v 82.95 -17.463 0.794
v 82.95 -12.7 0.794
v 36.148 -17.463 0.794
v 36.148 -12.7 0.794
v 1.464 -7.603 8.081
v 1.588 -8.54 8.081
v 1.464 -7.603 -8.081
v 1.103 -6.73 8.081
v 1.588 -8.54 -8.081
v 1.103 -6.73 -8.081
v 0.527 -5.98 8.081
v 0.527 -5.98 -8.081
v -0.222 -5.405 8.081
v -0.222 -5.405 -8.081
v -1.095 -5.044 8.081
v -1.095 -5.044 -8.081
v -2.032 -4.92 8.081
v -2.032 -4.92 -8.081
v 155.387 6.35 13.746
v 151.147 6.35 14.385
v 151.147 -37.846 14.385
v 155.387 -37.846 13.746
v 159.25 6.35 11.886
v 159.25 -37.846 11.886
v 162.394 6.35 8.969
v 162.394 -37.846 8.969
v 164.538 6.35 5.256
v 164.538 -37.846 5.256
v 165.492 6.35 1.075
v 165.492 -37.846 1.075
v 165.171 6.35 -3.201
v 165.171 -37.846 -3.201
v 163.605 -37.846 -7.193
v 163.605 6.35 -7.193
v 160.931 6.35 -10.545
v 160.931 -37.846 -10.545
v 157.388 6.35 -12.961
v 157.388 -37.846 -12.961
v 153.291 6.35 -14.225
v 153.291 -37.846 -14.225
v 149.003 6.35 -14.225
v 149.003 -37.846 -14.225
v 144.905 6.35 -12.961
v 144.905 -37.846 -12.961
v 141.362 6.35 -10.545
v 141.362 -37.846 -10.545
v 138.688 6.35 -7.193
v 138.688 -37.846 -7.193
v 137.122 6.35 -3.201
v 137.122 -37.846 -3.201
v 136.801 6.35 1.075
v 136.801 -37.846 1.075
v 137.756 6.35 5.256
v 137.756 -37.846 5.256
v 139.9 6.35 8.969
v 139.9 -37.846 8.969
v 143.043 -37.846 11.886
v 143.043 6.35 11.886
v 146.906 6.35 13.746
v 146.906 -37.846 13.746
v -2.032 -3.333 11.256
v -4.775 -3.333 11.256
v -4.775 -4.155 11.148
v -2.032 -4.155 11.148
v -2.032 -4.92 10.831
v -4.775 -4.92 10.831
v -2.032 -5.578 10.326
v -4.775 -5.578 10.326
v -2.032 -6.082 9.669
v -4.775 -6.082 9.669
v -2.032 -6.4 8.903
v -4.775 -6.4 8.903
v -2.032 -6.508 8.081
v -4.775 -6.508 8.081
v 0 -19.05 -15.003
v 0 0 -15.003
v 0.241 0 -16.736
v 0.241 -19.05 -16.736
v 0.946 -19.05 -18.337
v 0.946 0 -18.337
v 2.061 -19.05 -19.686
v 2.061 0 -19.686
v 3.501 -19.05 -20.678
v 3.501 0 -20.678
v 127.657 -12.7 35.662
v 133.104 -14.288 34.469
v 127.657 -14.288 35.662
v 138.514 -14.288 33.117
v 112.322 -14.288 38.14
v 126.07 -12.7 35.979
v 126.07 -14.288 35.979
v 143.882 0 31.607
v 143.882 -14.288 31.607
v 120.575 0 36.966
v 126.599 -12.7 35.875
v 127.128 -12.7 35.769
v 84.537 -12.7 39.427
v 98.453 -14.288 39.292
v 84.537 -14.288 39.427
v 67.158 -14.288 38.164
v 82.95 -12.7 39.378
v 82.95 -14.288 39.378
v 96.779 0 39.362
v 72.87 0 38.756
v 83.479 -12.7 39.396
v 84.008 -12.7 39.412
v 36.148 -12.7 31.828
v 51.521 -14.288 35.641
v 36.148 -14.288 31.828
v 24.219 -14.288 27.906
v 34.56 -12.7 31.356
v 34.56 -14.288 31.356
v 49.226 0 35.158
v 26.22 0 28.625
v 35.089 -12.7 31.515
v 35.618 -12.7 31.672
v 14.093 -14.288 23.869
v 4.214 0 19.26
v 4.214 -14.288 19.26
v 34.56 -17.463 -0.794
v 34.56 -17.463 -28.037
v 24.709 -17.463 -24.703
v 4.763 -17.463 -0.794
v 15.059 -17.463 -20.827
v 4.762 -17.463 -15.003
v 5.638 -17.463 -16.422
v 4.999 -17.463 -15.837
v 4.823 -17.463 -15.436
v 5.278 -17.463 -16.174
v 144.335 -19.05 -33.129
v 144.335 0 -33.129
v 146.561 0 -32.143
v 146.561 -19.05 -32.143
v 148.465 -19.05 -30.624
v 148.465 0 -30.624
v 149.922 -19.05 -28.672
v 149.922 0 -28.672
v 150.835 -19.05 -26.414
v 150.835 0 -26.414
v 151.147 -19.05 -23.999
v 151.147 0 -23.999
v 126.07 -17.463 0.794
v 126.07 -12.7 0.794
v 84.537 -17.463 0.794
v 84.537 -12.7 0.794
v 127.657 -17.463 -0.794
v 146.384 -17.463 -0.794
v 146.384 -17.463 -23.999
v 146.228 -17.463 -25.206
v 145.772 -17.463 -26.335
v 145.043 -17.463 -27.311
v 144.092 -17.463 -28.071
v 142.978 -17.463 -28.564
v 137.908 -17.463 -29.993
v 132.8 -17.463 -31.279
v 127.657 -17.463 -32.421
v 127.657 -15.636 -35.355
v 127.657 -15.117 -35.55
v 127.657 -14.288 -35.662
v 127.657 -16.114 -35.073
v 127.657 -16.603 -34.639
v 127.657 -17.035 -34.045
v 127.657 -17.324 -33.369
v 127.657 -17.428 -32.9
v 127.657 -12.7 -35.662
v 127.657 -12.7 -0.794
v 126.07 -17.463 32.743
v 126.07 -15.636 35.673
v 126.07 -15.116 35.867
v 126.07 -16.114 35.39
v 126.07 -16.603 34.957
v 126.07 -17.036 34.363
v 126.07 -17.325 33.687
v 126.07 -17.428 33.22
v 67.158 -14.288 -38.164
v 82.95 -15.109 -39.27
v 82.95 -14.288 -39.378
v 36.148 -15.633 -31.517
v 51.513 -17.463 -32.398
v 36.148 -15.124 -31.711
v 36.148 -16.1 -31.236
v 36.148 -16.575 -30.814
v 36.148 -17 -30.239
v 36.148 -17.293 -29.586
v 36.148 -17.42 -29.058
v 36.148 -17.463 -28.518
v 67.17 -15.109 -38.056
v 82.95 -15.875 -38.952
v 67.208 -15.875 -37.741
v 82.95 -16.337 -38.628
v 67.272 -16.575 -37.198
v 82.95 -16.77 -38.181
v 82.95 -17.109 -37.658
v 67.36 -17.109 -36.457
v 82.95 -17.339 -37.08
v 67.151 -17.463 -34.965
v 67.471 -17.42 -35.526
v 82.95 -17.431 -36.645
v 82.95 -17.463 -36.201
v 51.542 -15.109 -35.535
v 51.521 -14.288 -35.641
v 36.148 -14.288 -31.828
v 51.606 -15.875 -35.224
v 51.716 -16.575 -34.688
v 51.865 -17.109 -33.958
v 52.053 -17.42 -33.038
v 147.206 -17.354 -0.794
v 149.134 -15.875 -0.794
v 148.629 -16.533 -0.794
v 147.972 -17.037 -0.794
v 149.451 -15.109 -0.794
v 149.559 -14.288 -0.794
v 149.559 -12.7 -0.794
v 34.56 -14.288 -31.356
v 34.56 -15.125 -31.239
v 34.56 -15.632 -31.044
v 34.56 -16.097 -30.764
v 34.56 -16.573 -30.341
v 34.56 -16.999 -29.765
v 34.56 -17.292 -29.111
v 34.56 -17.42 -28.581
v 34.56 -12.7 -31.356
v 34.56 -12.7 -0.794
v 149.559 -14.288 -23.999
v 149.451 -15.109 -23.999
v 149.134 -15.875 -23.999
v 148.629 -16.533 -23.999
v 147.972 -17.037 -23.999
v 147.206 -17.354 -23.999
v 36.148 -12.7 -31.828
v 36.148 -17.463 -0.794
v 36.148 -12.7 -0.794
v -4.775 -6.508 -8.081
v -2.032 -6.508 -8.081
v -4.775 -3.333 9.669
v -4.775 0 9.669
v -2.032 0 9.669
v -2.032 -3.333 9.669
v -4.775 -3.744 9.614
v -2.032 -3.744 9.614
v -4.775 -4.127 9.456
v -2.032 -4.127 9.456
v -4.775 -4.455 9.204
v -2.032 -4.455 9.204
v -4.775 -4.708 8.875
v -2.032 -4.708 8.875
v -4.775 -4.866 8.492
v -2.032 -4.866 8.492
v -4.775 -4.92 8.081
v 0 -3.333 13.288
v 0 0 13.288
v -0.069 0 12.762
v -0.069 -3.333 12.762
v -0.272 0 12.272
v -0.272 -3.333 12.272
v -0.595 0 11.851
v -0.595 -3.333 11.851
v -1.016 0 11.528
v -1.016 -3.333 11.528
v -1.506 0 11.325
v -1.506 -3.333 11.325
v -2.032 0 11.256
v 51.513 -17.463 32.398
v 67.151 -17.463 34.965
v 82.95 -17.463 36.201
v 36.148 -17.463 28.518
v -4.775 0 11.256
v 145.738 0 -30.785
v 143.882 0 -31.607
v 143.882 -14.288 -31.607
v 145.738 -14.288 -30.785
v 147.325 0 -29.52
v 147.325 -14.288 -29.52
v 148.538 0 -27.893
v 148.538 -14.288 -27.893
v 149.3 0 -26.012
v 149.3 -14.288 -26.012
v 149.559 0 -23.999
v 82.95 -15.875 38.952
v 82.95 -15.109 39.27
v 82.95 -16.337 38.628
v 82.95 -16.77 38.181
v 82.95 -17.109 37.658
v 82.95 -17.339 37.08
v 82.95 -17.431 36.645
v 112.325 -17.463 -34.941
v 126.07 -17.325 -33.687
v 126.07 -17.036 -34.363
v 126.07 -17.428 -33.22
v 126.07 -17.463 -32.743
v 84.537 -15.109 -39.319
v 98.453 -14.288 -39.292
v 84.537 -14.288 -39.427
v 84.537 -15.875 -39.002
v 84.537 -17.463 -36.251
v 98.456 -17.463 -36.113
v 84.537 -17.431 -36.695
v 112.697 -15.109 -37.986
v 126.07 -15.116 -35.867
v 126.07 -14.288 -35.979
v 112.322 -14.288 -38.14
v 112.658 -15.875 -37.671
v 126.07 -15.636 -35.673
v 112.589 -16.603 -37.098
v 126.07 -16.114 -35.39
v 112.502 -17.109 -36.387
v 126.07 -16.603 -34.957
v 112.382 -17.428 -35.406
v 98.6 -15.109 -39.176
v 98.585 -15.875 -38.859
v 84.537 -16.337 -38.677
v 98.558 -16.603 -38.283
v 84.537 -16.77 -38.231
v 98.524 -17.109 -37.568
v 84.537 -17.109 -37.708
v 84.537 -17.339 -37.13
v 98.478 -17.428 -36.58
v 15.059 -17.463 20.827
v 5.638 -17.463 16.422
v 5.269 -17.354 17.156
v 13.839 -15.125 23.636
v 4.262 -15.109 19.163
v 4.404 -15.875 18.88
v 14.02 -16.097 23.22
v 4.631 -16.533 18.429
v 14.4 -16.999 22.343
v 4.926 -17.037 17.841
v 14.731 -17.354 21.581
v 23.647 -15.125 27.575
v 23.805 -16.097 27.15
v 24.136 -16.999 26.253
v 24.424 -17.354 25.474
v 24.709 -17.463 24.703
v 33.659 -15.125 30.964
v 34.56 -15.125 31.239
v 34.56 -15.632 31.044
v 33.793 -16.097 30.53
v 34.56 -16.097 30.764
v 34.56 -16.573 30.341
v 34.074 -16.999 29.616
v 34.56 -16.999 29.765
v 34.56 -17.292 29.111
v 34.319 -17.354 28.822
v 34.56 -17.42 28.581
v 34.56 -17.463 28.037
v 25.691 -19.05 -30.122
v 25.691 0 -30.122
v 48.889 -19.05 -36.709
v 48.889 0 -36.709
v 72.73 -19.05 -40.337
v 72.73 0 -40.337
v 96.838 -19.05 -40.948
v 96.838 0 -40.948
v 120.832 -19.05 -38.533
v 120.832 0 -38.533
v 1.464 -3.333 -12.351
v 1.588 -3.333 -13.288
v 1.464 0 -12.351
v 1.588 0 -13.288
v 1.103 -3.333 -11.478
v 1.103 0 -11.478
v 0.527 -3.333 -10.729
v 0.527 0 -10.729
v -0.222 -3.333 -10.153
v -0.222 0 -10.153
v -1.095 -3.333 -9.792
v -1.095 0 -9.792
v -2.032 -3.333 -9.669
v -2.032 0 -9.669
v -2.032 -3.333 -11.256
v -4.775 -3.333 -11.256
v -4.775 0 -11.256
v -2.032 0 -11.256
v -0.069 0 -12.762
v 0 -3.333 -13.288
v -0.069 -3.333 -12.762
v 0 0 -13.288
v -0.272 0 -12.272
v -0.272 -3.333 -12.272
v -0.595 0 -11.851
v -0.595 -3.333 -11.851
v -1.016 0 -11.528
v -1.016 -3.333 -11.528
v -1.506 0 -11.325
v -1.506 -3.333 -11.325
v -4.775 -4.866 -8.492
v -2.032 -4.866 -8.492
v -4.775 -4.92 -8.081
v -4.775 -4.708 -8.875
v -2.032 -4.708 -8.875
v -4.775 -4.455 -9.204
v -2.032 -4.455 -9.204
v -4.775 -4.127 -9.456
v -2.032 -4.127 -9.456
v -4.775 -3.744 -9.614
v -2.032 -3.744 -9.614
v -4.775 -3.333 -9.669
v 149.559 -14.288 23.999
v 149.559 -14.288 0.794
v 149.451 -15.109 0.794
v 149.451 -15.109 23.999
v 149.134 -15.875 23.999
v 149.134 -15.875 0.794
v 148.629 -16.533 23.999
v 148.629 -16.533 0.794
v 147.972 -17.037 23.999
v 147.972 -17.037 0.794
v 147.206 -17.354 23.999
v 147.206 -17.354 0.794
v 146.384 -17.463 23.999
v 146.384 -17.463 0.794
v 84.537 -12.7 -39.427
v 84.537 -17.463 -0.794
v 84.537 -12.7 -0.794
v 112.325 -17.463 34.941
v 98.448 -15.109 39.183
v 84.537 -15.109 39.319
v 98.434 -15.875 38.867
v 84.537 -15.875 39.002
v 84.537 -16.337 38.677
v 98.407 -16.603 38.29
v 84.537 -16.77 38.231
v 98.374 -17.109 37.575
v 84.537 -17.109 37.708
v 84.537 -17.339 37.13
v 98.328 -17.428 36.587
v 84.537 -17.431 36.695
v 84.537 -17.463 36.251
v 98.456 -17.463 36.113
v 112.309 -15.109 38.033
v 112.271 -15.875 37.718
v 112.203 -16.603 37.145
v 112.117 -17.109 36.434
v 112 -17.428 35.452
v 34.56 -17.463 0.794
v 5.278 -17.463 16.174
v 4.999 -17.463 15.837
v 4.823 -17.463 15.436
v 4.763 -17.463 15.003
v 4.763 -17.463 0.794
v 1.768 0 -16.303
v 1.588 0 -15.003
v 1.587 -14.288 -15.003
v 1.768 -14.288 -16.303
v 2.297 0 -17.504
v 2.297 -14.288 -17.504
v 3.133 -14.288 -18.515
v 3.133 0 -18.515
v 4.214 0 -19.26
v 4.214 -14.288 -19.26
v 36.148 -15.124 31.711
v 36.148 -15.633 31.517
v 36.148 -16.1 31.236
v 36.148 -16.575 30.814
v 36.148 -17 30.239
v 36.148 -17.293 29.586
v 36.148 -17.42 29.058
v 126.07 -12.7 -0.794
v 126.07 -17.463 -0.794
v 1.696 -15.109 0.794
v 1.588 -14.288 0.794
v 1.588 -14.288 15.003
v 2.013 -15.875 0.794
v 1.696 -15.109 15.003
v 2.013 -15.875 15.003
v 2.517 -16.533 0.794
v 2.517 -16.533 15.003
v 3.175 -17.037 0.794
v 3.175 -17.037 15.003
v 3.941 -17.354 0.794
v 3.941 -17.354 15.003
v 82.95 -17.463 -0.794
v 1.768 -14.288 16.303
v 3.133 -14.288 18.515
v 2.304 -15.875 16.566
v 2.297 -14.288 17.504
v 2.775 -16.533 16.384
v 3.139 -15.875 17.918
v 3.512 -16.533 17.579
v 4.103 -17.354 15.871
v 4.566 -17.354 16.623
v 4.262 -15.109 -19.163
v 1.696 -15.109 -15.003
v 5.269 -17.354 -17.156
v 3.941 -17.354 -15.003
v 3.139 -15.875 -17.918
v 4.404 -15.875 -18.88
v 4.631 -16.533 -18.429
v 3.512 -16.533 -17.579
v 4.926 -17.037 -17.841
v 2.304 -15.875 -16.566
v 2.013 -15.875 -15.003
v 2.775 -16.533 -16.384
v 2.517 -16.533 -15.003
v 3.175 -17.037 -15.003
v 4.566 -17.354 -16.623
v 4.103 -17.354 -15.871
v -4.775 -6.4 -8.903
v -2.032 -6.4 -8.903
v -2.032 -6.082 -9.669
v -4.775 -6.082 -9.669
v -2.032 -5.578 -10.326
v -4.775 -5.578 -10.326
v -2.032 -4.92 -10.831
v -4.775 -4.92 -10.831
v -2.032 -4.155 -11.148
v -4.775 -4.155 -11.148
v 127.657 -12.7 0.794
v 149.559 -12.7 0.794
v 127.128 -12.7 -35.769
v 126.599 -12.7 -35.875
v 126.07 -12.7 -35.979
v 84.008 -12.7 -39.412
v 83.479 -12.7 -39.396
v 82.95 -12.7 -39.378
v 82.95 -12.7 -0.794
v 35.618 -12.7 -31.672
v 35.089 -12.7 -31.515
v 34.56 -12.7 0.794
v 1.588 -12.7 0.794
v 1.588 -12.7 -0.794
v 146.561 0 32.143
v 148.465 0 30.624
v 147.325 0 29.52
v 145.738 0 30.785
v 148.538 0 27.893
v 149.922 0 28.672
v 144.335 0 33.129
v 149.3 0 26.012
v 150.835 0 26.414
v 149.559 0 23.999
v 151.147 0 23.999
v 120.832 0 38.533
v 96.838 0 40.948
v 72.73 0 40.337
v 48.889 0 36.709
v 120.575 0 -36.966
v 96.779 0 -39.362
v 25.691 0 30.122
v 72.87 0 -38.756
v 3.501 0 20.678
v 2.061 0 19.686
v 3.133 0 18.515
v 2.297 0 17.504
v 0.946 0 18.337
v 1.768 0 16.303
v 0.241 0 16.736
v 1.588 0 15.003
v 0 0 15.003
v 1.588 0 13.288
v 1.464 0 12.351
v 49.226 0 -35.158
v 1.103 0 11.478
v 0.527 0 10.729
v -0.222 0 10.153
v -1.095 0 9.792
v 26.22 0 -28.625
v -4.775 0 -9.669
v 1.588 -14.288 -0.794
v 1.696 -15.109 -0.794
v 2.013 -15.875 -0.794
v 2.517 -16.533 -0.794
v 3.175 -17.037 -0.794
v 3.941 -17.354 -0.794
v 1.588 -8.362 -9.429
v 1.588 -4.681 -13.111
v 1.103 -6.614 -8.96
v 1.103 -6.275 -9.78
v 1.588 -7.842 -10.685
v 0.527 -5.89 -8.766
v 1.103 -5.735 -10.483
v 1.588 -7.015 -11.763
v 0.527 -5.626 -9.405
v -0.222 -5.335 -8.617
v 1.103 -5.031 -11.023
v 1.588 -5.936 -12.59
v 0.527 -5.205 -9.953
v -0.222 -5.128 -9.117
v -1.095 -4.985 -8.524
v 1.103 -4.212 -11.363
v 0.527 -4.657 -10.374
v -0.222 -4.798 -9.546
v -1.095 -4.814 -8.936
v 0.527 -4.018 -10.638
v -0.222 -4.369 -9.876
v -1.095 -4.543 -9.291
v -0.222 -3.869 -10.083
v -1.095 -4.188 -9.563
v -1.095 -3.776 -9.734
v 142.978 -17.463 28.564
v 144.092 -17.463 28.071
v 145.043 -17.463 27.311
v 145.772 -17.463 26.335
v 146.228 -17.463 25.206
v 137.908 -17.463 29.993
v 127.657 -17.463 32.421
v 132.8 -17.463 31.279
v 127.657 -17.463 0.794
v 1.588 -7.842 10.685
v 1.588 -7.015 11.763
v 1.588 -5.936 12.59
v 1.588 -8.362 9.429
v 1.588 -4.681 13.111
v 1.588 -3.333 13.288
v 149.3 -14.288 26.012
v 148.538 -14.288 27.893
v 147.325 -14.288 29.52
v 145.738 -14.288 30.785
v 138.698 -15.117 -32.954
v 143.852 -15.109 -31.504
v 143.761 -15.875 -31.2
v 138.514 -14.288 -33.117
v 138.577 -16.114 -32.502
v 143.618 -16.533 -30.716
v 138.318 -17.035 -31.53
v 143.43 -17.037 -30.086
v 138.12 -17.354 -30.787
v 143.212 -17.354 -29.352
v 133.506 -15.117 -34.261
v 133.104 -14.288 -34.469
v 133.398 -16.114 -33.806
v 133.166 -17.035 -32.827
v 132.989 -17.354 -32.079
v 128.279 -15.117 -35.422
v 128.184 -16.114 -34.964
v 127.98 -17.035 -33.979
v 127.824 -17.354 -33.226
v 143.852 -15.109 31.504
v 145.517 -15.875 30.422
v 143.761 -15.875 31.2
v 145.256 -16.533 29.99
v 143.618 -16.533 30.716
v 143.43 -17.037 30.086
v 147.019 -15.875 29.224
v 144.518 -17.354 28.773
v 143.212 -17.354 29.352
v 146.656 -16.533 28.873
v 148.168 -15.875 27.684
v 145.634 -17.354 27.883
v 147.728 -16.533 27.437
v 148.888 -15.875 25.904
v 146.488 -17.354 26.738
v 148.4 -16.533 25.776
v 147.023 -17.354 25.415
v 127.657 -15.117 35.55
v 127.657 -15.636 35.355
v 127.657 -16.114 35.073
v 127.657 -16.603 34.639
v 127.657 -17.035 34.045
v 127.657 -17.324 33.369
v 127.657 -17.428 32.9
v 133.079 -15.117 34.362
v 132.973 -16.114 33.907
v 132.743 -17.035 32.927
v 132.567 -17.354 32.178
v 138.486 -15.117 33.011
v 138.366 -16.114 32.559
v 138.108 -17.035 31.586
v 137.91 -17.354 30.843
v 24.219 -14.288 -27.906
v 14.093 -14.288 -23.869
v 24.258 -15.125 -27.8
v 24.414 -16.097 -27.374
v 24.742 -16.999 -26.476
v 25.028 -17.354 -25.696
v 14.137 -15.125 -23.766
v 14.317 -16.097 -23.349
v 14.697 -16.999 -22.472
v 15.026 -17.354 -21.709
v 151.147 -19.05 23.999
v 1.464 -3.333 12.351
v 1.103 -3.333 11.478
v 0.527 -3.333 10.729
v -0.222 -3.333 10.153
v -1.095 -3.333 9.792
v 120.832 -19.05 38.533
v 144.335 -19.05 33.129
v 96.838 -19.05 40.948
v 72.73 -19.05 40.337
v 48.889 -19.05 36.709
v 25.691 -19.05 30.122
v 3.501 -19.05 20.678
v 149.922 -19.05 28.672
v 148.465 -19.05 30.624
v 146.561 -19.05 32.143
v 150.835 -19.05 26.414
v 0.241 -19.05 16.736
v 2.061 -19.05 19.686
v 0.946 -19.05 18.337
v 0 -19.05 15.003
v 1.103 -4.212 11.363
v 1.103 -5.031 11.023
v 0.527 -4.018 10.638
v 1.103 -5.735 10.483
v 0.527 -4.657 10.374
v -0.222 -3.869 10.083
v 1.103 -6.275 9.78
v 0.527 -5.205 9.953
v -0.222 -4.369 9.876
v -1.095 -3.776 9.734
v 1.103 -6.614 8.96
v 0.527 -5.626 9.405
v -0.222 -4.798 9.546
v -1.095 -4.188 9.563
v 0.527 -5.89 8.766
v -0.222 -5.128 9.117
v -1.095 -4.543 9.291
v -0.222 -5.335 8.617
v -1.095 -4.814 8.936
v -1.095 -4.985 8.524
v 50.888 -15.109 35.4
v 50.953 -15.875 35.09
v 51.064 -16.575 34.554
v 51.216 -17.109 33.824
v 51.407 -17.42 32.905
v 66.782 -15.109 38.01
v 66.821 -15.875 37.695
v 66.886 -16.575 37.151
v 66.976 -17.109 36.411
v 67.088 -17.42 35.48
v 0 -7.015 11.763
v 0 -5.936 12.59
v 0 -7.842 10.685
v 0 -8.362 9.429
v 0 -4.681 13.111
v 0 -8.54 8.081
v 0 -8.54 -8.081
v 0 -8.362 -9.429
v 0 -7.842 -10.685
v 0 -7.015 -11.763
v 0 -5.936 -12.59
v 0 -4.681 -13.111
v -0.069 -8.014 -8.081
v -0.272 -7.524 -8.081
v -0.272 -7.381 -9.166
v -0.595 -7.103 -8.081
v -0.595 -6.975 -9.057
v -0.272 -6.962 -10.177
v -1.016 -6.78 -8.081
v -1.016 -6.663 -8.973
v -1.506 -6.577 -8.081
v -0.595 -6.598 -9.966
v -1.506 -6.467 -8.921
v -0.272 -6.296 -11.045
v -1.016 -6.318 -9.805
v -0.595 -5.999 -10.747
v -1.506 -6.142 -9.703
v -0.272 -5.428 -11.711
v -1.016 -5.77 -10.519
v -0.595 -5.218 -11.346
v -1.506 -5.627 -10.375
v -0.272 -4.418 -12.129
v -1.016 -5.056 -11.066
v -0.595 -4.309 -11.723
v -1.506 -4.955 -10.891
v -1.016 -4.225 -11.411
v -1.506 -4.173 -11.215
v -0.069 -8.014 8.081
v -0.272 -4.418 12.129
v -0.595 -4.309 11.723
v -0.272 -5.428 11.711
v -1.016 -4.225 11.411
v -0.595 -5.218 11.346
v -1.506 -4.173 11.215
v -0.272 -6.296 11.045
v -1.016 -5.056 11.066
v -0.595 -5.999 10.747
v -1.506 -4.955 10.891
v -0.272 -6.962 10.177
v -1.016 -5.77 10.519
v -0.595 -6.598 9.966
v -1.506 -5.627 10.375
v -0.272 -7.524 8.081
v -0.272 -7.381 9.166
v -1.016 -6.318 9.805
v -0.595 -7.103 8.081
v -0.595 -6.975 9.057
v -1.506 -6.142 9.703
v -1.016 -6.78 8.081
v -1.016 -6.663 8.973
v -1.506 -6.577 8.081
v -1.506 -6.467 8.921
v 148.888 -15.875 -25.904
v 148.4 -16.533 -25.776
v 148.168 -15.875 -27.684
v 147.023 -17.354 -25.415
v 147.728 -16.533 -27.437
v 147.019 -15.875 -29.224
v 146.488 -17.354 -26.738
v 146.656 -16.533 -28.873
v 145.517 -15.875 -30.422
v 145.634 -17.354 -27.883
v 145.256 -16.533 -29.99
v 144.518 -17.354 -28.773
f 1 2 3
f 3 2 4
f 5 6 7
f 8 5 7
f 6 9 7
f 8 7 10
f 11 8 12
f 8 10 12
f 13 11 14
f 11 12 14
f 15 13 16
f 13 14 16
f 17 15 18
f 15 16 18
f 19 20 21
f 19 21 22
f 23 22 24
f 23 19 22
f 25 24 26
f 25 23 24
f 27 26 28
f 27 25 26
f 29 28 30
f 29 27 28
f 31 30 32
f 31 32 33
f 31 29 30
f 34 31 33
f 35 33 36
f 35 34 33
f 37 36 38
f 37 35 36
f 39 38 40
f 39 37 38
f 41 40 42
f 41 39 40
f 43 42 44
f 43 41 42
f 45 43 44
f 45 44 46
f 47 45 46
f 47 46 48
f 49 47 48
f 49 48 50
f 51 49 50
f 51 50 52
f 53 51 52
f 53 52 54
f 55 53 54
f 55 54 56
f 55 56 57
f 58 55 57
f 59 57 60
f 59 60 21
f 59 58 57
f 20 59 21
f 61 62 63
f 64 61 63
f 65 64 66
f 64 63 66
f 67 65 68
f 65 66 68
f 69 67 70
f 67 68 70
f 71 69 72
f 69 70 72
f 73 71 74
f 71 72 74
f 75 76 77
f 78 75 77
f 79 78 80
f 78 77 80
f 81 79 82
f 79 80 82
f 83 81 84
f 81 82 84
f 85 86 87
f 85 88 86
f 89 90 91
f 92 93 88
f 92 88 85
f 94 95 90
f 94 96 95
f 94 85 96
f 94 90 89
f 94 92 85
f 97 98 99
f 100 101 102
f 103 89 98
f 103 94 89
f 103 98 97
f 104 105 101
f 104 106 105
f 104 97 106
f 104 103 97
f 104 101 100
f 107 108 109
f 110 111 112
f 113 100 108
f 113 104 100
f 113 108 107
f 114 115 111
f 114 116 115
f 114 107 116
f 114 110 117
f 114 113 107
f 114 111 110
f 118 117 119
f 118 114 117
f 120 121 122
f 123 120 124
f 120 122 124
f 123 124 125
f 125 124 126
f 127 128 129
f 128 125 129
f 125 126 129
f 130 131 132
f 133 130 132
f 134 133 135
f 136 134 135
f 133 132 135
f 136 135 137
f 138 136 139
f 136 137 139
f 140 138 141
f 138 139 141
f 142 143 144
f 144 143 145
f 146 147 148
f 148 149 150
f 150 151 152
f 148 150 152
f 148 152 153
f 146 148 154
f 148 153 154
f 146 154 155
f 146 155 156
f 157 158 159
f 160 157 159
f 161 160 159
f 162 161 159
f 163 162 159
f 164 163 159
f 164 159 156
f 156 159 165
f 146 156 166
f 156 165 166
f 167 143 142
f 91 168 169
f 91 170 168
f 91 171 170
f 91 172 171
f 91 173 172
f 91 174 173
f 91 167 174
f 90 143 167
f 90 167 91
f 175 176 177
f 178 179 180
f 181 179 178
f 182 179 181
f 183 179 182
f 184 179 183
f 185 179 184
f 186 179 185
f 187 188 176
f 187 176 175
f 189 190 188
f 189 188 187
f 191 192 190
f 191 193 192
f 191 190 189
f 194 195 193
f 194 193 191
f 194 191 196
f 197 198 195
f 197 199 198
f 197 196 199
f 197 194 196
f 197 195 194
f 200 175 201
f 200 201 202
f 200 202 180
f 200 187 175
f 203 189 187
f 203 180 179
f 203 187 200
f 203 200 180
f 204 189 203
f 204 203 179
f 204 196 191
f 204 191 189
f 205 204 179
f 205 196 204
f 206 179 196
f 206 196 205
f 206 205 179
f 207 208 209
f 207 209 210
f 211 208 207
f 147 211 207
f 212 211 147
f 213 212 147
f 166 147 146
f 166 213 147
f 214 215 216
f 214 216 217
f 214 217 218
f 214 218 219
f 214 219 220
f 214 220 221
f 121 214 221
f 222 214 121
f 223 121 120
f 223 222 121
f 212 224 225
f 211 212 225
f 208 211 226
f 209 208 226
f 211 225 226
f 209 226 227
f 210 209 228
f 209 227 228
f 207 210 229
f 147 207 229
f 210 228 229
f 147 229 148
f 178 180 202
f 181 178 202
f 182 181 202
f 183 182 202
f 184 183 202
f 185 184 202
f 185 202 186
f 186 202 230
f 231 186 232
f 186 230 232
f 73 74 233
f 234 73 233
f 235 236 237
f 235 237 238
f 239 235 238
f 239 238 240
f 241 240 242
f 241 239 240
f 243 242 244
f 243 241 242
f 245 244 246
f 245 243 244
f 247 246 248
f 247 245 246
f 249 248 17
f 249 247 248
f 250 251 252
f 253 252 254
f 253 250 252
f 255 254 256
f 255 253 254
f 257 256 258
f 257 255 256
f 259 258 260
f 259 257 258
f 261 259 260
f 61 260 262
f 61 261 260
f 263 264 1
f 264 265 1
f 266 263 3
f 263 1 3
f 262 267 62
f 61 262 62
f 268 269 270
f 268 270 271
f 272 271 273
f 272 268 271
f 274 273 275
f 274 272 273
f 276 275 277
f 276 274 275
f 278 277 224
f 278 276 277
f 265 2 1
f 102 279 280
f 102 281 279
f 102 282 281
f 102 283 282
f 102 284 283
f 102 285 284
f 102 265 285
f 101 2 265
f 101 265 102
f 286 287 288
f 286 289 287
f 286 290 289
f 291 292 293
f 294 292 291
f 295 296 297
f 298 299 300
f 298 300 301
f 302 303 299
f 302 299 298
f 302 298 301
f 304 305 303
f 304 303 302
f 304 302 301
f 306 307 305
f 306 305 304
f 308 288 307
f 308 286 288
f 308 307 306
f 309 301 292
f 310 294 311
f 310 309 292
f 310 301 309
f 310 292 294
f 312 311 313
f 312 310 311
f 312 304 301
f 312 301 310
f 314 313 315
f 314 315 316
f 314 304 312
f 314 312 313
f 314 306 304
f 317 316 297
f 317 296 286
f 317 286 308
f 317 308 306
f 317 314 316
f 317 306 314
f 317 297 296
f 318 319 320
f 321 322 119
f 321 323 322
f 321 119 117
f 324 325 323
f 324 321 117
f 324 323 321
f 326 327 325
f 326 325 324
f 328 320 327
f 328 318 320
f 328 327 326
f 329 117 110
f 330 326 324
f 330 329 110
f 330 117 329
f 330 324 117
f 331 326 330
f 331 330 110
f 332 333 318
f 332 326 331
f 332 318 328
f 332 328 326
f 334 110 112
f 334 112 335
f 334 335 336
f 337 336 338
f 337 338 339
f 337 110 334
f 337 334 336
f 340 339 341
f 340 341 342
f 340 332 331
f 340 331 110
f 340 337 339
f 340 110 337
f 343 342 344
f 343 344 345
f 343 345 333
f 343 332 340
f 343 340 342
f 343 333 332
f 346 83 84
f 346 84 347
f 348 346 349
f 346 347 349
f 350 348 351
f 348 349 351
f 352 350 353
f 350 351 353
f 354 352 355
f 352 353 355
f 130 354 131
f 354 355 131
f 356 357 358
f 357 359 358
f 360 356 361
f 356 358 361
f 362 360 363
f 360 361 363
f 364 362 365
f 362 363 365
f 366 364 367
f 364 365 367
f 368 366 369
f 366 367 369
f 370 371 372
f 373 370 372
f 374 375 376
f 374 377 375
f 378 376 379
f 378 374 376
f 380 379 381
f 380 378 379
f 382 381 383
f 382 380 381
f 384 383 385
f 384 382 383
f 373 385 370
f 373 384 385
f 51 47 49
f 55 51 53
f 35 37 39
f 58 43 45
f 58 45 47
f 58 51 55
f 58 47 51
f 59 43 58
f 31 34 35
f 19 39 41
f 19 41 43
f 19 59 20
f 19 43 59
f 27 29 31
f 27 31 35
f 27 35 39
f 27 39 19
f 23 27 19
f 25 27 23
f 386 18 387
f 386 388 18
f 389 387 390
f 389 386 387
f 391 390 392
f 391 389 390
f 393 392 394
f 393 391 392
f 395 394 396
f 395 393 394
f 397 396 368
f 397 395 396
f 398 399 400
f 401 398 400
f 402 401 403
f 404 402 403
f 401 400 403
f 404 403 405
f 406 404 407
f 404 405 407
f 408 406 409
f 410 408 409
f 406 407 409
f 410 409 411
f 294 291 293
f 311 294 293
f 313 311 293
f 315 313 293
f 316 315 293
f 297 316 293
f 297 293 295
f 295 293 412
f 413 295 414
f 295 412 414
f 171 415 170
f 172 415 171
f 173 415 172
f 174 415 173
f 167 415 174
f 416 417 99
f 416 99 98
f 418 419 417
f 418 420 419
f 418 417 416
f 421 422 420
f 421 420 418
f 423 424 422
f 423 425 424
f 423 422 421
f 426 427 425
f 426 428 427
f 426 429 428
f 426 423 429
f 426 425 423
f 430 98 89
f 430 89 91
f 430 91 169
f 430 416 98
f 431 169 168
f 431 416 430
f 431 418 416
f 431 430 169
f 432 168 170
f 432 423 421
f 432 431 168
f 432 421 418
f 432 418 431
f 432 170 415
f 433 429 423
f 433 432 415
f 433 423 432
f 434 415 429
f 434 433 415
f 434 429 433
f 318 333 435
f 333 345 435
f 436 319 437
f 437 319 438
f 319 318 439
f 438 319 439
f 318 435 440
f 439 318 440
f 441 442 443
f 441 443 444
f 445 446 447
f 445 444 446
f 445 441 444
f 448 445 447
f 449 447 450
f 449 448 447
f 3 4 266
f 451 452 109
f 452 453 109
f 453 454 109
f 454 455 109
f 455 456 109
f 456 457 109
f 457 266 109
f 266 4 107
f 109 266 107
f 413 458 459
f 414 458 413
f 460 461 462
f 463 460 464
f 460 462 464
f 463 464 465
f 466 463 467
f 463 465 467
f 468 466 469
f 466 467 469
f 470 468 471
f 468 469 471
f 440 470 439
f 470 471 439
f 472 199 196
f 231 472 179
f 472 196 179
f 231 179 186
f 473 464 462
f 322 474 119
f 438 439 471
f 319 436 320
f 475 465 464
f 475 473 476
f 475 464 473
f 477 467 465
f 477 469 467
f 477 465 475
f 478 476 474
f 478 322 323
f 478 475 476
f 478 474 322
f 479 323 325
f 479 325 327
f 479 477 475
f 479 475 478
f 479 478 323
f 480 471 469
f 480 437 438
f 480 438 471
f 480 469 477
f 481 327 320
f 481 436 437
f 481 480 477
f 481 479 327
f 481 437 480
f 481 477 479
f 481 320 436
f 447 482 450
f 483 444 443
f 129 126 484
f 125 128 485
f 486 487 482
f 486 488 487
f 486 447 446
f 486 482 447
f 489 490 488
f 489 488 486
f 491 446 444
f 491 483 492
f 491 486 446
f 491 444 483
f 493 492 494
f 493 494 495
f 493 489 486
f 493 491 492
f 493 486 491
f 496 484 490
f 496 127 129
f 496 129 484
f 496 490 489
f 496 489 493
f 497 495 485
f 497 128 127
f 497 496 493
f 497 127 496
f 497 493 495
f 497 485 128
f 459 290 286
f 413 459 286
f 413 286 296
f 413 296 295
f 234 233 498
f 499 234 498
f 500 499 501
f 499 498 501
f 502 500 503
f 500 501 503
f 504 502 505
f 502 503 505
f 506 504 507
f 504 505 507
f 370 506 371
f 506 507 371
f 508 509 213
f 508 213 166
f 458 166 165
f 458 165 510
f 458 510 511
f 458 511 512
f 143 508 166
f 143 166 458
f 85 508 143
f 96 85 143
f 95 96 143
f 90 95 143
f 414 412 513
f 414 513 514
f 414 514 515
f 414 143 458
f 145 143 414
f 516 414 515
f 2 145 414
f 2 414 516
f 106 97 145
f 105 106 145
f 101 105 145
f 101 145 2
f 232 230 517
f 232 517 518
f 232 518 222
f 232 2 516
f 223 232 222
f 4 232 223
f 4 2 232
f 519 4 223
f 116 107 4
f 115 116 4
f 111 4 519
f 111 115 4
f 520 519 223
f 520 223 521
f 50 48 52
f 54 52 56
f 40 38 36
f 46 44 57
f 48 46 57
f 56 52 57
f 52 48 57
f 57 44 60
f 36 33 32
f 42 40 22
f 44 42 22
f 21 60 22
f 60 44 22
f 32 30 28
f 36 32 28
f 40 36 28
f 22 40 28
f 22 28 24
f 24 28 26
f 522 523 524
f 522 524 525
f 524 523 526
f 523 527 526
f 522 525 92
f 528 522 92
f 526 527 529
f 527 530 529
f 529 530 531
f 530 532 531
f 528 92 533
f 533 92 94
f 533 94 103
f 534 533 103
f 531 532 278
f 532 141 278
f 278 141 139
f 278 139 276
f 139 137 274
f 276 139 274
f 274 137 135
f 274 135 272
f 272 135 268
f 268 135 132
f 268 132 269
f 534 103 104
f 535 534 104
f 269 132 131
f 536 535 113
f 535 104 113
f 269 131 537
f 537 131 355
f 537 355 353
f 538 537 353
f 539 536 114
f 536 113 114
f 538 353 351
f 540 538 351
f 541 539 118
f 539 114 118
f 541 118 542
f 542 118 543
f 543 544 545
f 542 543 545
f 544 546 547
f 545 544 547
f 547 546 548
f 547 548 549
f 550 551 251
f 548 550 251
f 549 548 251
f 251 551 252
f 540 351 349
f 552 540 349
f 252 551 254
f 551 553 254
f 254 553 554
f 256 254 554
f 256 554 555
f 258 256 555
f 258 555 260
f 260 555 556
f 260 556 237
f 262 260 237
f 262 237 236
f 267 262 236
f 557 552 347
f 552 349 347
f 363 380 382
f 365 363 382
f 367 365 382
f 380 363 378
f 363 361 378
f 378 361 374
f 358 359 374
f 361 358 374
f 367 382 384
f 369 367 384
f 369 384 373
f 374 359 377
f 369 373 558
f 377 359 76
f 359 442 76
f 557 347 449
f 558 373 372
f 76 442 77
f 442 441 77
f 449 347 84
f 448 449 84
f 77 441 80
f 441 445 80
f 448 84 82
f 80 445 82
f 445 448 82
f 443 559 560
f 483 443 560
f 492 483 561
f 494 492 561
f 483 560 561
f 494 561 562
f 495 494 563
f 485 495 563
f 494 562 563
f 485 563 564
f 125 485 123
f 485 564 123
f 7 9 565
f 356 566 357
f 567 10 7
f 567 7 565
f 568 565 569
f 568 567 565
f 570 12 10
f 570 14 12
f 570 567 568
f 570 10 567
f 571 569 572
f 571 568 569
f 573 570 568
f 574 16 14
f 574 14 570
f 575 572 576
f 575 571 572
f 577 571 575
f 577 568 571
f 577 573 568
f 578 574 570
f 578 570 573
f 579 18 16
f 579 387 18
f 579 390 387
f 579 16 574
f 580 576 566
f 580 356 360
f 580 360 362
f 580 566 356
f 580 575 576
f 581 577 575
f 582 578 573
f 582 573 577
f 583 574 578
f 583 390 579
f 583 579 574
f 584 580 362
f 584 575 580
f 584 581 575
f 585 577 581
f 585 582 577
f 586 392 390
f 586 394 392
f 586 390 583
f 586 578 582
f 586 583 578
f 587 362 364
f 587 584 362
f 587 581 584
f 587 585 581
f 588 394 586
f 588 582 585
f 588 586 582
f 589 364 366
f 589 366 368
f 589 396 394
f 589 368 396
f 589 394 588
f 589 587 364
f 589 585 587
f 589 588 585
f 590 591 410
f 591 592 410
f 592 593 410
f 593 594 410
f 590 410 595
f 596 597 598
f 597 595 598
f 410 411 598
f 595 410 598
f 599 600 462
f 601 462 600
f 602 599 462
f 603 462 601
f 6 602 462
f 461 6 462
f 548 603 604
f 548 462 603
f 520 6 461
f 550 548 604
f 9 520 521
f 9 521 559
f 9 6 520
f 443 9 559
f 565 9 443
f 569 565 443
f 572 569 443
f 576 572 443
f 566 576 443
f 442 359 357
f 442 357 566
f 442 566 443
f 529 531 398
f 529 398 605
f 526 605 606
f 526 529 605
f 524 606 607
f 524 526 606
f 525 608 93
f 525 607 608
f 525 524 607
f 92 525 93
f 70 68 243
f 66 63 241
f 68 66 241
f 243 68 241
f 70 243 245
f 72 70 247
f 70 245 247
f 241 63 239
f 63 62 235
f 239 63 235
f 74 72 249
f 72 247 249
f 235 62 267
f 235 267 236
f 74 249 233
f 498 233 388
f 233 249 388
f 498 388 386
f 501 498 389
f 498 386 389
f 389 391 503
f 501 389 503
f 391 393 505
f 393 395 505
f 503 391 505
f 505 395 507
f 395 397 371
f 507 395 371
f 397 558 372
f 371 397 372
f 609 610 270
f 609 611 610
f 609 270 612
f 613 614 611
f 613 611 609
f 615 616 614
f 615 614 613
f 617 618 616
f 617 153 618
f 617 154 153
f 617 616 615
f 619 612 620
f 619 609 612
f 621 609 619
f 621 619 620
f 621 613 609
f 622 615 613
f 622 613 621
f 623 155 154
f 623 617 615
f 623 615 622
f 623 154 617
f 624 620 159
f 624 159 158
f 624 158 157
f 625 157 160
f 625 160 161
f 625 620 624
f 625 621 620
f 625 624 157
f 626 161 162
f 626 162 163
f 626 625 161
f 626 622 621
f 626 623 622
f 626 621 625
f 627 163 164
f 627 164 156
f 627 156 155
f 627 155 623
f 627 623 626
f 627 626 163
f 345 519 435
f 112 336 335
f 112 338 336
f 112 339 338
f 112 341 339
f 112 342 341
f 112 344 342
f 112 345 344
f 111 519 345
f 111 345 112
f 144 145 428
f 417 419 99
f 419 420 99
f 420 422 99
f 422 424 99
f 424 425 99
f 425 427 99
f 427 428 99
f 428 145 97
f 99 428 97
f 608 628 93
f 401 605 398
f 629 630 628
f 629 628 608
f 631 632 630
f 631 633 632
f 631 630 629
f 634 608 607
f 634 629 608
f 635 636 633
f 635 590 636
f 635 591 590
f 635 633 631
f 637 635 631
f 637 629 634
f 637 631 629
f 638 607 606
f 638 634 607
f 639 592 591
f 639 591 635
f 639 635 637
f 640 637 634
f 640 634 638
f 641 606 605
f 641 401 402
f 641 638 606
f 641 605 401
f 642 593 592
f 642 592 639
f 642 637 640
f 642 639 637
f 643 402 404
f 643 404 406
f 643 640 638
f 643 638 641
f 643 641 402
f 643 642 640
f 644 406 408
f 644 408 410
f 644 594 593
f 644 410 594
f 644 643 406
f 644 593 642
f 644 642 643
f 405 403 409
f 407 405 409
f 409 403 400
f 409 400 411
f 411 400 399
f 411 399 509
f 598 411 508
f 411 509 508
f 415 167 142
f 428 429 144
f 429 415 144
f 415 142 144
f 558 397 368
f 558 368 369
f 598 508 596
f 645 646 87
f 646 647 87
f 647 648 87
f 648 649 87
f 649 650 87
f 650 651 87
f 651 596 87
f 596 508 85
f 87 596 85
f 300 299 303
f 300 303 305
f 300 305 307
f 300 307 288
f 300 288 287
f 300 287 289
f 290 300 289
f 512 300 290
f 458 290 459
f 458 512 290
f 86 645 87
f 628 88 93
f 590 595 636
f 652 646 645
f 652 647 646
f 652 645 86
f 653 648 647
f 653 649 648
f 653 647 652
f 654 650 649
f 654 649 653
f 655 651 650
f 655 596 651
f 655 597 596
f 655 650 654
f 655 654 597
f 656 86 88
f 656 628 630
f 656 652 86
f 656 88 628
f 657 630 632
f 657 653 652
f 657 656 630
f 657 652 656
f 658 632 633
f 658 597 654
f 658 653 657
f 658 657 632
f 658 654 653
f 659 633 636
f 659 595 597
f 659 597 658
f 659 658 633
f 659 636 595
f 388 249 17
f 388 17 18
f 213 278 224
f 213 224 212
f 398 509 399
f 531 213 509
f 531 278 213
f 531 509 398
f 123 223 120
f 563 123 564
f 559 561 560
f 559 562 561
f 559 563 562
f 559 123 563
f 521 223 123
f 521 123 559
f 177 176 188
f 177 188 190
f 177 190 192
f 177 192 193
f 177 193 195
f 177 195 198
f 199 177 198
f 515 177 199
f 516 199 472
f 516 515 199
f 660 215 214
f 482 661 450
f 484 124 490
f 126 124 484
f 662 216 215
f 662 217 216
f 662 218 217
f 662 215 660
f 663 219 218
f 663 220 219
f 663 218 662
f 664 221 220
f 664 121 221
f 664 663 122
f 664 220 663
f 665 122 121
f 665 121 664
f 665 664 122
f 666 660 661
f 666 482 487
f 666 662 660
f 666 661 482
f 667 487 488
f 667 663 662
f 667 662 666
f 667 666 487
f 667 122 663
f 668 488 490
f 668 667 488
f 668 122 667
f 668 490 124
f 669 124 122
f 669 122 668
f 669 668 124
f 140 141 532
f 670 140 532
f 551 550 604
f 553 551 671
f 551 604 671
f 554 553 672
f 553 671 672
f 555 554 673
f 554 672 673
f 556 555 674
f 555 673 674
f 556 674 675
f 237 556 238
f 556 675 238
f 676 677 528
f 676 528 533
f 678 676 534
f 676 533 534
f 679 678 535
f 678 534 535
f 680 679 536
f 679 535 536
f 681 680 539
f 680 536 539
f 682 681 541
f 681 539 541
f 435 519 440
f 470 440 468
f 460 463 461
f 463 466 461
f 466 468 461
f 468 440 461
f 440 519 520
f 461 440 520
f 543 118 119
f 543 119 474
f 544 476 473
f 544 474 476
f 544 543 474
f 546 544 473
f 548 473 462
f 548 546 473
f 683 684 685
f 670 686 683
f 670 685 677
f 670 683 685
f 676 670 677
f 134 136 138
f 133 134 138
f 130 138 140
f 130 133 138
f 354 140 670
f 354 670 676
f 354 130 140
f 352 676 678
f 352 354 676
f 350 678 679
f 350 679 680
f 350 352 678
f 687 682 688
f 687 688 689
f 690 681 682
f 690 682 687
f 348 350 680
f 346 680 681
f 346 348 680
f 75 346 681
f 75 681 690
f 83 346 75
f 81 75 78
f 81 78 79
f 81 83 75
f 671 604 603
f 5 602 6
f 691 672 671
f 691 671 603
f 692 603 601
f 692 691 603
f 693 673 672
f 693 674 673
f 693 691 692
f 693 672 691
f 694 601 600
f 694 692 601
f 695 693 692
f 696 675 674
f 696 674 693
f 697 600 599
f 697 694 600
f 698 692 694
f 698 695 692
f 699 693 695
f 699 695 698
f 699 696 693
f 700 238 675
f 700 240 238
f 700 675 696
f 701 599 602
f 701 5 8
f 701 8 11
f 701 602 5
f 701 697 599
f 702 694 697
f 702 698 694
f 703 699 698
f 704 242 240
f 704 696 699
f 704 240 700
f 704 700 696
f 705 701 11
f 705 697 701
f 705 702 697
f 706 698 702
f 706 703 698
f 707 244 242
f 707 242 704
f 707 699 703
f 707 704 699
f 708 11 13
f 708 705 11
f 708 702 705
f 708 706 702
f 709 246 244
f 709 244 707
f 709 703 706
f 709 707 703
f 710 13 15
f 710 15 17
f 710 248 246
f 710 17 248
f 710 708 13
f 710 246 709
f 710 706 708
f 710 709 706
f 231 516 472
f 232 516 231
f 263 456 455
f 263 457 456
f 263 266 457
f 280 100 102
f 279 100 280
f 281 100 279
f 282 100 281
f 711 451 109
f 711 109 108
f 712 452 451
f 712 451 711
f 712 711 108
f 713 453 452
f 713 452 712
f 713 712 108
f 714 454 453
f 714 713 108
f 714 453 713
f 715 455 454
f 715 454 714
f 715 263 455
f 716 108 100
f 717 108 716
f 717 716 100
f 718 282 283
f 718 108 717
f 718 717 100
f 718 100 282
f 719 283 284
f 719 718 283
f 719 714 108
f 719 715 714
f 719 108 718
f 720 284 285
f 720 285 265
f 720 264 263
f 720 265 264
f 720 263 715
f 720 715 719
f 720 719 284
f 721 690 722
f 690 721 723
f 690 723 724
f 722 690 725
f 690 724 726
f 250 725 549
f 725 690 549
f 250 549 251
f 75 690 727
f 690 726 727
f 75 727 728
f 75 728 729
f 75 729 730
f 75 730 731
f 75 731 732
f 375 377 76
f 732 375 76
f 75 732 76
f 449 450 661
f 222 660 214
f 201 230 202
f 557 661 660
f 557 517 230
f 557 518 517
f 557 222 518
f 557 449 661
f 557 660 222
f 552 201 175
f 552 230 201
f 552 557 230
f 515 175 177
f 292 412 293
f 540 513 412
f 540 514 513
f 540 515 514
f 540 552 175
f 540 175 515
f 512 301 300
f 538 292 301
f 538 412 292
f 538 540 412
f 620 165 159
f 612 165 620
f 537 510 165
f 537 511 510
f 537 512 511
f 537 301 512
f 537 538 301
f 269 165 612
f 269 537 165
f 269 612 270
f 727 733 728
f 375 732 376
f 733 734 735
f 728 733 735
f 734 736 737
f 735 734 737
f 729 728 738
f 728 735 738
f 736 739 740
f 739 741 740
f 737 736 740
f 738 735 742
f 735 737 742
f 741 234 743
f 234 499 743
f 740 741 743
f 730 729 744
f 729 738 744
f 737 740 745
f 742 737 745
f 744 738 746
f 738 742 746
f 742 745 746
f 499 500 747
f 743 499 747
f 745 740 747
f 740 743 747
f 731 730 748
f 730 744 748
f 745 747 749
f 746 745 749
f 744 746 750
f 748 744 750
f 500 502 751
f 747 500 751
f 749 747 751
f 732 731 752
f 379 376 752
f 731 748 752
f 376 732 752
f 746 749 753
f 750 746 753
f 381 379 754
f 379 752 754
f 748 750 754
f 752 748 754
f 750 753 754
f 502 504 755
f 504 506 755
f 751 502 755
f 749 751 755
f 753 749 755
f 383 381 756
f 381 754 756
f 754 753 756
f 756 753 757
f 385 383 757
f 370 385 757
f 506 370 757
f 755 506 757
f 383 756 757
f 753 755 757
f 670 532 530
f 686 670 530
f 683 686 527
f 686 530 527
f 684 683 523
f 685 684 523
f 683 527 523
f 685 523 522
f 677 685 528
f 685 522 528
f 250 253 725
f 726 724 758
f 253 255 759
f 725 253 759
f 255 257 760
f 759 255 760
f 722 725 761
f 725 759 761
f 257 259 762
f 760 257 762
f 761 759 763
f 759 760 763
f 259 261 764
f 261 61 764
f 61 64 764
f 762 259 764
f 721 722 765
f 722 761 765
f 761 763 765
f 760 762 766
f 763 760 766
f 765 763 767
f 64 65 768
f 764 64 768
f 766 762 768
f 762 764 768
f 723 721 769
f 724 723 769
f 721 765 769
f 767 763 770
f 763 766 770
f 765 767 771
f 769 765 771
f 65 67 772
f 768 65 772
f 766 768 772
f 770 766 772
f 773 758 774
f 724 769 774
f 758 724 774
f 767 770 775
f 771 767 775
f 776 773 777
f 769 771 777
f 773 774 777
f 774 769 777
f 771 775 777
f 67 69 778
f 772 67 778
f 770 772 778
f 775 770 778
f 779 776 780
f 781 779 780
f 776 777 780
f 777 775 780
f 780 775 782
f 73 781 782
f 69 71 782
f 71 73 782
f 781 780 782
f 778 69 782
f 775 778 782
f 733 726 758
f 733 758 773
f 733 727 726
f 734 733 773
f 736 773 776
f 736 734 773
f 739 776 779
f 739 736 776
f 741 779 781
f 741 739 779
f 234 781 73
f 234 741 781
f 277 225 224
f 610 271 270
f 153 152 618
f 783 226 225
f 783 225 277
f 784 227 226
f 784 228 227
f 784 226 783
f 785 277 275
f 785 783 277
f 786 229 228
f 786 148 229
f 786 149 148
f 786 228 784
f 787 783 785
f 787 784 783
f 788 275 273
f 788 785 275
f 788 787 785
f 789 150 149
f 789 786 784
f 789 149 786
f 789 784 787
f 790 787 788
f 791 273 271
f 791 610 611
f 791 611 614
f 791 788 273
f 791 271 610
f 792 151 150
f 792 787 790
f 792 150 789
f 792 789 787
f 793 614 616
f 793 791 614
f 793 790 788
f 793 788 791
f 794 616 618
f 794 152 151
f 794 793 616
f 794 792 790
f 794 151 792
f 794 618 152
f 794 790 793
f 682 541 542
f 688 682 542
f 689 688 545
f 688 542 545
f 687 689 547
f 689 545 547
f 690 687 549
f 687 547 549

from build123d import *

# Parameters (mm, degrees)
BOSS_EXTRUDE1_DEPTH = 19.05
BOSS_EXTRUDE2_REACH = 164.365
FILLET2_R           = 2.032
SHELL1_T            = -1.5875
SKETCH6_R           = 14.38546282
BOSS_EXTRUDE3_DEPTH = 44.196
FILLET3_R           = 3.175
RIB1_REACH          = 174.398
SKETCH3_WALLS_W     = 491.592314098
SKETCH3_WALLS_H     = 1.5875
SKETCH3_WALLS_W_2   = 1.5875
SKETCH3_WALLS_H_2   = 370.365662837
SKETCH3_WALLS_H_3   = 364.731456944
SKETCH3_WALLS_H_4   = 378.244453173
SKETCH3_WALLS_H_5   = 370.112190103
SKETCH3_WALLS_H_6   = 377.142820727
SKETCH3_WALLS_H_7   = 367.242465752


with BuildPart() as part:
    # Sketch1 → Boss-Extrude1 (new body)
    with BuildSketch(Plane(origin=(0, 0, 0), x_dir=(1, 0, 0), z_dir=(0, 1, 0))):
        with BuildLine():
            Line((151.14663435, 23.998631985), (151.14663435, -23.998631985))
            ThreePointArc((151.14663435, -23.998631985), (149.255998086, -29.694430028), (144.334641628, -33.129087424))
            ThreePointArc((144.334641628, -33.129087424), (72.730464863, -40.337037619), (3.501469246, -20.678481157))
            ThreePointArc((3.501469246, -20.678481157), (0.945803932, -18.337480359), (0, -15.003239088))
            Line((0, -15.003239088), (0, 15.003239088))
            ThreePointArc((0, 15.003239088), (0.945803932, 18.337480359), (3.501469246, 20.678481157))
            ThreePointArc((3.501469246, 20.678481157), (72.730464863, 40.337037619), (144.334641628, 33.129087424))
            ThreePointArc((144.334641628, 33.129087424), (149.255998086, 29.694430028), (151.14663435, 23.998631985))
        make_face()
    extrude(amount=-BOSS_EXTRUDE1_DEPTH)

    # Sketch2 → Boss-Extrude2 (add, up to next)
    with BuildSketch(Plane.ZY.offset(4.7752), mode=Mode.PRIVATE) as boss_extrude2_sk1:
        with BuildLine():
            Line((0, 0), (11.256017669, 0))
            Line((11.256017669, 0), (11.256017669, -3.332868092))
            ThreePointArc((11.256017669, -3.332868092), (10.326081699, -5.577932122), (8.081017669, -6.507868092))
            Line((8.081017669, -6.507868092), (-8.081017669, -6.507868092))
            ThreePointArc((-8.081017669, -6.507868092), (-10.326081699, -5.577932122), (-11.256017669, -3.332868092))
            Line((-11.256017669, -3.332868092), (-11.256017669, 0))
            Line((-11.256017669, 0), (0, 0))
        make_face()
    boss_extrude2_tool1 = extrude(boss_extrude2_sk1.sketch, amount=-BOSS_EXTRUDE2_REACH, mode=Mode.PRIVATE) - part.part
    add(boss_extrude2_tool1.solids().sort_by_distance((-4.7752, -3.176495, 0))[0])

    # Fillet2
    fillet2_edges = [part.edges().sort_by_distance(p)[0] for p in [
        (0, -1.666434046, -11.256017669),
        (0, -1.666434046, 11.256017669),
        (0, -5.577932122, 10.326081699),
        (0, -6.507868092, 0),
        (0, -5.577932122, -10.326081699),
    ]]
    fillet(fillet2_edges, radius=FILLET2_R)

    # Shell1
    shell1_openings = [part.faces().sort_by_distance(p)[0] for p in [
        (-4.7752, -3.176495023, 0),
        (78.808938496, 0, 0),
    ]]
    offset(amount=SHELL1_T, openings=shell1_openings)

    # Fillet3
    fillet3_edges = [part.edges().sort_by_distance(p)[0] for p in [
        (147.98360413, -17.4625, 28.745130354),
        (72.870265354, -17.4625, 38.755705246),
        (1.5875, -17.4625, 0),
        (2.296852949, -17.4625, -17.503920041),
        (147.98360413, -17.4625, -28.745130354),
        (149.55913435, -17.4625, 0),
        (2.296852949, -17.4625, 17.503920041),
        (72.870265354, -17.4625, -38.755705246),
    ]]
    fillet(fillet3_edges, radius=FILLET3_R)

    # Sketch3 walls → Rib1 (add, up to next)
    with BuildSketch(Plane(origin=(0, -12.7, 0), x_dir=(-1, 0, 0), z_dir=(0, 1, 0)), mode=Mode.PRIVATE) as rib1_sk1:
        with Locations((-75.573317175, 0)):
            Rectangle(SKETCH3_WALLS_W, SKETCH3_WALLS_H)
    rib1_tool1 = extrude(rib1_sk1.sketch, amount=-RIB1_REACH, mode=Mode.PRIVATE) - part.part
    # Sketch3 walls → Rib1 (add, up to next)
    with BuildSketch(Plane(origin=(0, -12.7, 0), x_dir=(-1, 0, 0), z_dir=(0, 1, 0)), mode=Mode.PRIVATE) as rib1_sk2:
        with Locations((-35.354017225, 18.152192449)):
            Rectangle(SKETCH3_WALLS_W_2, SKETCH3_WALLS_H_2)
    rib1_tool2 = extrude(rib1_sk2.sketch, amount=-RIB1_REACH, mode=Mode.PRIVATE) - part.part
    # Sketch3 walls → Rib1 (add, up to next)
    with BuildSketch(Plane(origin=(0, -12.7, 0), x_dir=(-1, 0, 0), z_dir=(0, 1, 0)), mode=Mode.PRIVATE) as rib1_sk3:
        with Locations((-35.354017225, -12.644722923)):
            Rectangle(SKETCH3_WALLS_W_2, SKETCH3_WALLS_H_3)
    rib1_tool3 = extrude(rib1_sk3.sketch, amount=-RIB1_REACH, mode=Mode.PRIVATE) - part.part
    # Sketch3 walls → Rib1 (add, up to next)
    with BuildSketch(Plane(origin=(0, -12.7, 0), x_dir=(-1, 0, 0), z_dir=(0, 1, 0)), mode=Mode.PRIVATE) as rib1_sk4:
        with Locations((-83.743547004, 22.091587617)):
            Rectangle(SKETCH3_WALLS_W_2, SKETCH3_WALLS_H_4)
    rib1_tool4 = extrude(rib1_sk4.sketch, amount=-RIB1_REACH, mode=Mode.PRIVATE) - part.part
    # Sketch3 walls → Rib1 (add, up to next)
    with BuildSketch(Plane(origin=(0, -12.7, 0), x_dir=(-1, 0, 0), z_dir=(0, 1, 0)), mode=Mode.PRIVATE) as rib1_sk5:
        with Locations((-83.743547004, -15.335089502)):
            Rectangle(SKETCH3_WALLS_W_2, SKETCH3_WALLS_H_5)
    rib1_tool5 = extrude(rib1_sk5.sketch, amount=-RIB1_REACH, mode=Mode.PRIVATE) - part.part
    # Sketch3 walls → Rib1 (add, up to next)
    with BuildSketch(Plane(origin=(0, -12.7, 0), x_dir=(-1, 0, 0), z_dir=(0, 1, 0)), mode=Mode.PRIVATE) as rib1_sk6:
        with Locations((-126.863507058, 19.029762586)):
            Rectangle(SKETCH3_WALLS_W_2, SKETCH3_WALLS_H_6)
    rib1_tool6 = extrude(rib1_sk6.sketch, amount=-RIB1_REACH, mode=Mode.PRIVATE) - part.part
    # Sketch3 walls → Rib1 (add, up to next)
    with BuildSketch(Plane(origin=(0, -12.7, 0), x_dir=(-1, 0, 0), z_dir=(0, 1, 0)), mode=Mode.PRIVATE) as rib1_sk7:
        with Locations((-126.863507058, -13.900227327)):
            Rectangle(SKETCH3_WALLS_W_2, SKETCH3_WALLS_H_7)
    rib1_tool7 = extrude(rib1_sk7.sketch, amount=-RIB1_REACH, mode=Mode.PRIVATE) - part.part
    add(rib1_tool1.solids().sort_by_distance((75.573317175, -12.7, 0))[0])
    add(rib1_tool2.solids().sort_by_distance((35.354017225, -12.7, 18.152192449))[0])
    add(rib1_tool3.solids().sort_by_distance((35.354017225, -12.7, -12.644722923))[0])
    add(rib1_tool4.solids().sort_by_distance((83.743547004, -12.7, 22.091587617))[0])
    add(rib1_tool5.solids().sort_by_distance((83.743547004, -12.7, -15.335089503))[0])
    add(rib1_tool6.solids().sort_by_distance((126.863507058, -12.7, 19.029762586))[0])
    add(rib1_tool7.solids().sort_by_distance((126.863507058, -12.7, -13.900227327))[0])


with BuildPart() as body_2:
    # Sketch6 → Boss-Extrude3 (new body)
    with BuildSketch(Plane(origin=(0, 6.35, 0), x_dir=(-1, 0, 0), z_dir=(0, 1, 0))):
        with Locations(Location((-151.14663435, 0, 0), (0, 0, 90))):
            Circle(SKETCH6_R)
    extrude(amount=-BOSS_EXTRUDE3_DEPTH)


solid = Compound([part.part, body_2.part])
